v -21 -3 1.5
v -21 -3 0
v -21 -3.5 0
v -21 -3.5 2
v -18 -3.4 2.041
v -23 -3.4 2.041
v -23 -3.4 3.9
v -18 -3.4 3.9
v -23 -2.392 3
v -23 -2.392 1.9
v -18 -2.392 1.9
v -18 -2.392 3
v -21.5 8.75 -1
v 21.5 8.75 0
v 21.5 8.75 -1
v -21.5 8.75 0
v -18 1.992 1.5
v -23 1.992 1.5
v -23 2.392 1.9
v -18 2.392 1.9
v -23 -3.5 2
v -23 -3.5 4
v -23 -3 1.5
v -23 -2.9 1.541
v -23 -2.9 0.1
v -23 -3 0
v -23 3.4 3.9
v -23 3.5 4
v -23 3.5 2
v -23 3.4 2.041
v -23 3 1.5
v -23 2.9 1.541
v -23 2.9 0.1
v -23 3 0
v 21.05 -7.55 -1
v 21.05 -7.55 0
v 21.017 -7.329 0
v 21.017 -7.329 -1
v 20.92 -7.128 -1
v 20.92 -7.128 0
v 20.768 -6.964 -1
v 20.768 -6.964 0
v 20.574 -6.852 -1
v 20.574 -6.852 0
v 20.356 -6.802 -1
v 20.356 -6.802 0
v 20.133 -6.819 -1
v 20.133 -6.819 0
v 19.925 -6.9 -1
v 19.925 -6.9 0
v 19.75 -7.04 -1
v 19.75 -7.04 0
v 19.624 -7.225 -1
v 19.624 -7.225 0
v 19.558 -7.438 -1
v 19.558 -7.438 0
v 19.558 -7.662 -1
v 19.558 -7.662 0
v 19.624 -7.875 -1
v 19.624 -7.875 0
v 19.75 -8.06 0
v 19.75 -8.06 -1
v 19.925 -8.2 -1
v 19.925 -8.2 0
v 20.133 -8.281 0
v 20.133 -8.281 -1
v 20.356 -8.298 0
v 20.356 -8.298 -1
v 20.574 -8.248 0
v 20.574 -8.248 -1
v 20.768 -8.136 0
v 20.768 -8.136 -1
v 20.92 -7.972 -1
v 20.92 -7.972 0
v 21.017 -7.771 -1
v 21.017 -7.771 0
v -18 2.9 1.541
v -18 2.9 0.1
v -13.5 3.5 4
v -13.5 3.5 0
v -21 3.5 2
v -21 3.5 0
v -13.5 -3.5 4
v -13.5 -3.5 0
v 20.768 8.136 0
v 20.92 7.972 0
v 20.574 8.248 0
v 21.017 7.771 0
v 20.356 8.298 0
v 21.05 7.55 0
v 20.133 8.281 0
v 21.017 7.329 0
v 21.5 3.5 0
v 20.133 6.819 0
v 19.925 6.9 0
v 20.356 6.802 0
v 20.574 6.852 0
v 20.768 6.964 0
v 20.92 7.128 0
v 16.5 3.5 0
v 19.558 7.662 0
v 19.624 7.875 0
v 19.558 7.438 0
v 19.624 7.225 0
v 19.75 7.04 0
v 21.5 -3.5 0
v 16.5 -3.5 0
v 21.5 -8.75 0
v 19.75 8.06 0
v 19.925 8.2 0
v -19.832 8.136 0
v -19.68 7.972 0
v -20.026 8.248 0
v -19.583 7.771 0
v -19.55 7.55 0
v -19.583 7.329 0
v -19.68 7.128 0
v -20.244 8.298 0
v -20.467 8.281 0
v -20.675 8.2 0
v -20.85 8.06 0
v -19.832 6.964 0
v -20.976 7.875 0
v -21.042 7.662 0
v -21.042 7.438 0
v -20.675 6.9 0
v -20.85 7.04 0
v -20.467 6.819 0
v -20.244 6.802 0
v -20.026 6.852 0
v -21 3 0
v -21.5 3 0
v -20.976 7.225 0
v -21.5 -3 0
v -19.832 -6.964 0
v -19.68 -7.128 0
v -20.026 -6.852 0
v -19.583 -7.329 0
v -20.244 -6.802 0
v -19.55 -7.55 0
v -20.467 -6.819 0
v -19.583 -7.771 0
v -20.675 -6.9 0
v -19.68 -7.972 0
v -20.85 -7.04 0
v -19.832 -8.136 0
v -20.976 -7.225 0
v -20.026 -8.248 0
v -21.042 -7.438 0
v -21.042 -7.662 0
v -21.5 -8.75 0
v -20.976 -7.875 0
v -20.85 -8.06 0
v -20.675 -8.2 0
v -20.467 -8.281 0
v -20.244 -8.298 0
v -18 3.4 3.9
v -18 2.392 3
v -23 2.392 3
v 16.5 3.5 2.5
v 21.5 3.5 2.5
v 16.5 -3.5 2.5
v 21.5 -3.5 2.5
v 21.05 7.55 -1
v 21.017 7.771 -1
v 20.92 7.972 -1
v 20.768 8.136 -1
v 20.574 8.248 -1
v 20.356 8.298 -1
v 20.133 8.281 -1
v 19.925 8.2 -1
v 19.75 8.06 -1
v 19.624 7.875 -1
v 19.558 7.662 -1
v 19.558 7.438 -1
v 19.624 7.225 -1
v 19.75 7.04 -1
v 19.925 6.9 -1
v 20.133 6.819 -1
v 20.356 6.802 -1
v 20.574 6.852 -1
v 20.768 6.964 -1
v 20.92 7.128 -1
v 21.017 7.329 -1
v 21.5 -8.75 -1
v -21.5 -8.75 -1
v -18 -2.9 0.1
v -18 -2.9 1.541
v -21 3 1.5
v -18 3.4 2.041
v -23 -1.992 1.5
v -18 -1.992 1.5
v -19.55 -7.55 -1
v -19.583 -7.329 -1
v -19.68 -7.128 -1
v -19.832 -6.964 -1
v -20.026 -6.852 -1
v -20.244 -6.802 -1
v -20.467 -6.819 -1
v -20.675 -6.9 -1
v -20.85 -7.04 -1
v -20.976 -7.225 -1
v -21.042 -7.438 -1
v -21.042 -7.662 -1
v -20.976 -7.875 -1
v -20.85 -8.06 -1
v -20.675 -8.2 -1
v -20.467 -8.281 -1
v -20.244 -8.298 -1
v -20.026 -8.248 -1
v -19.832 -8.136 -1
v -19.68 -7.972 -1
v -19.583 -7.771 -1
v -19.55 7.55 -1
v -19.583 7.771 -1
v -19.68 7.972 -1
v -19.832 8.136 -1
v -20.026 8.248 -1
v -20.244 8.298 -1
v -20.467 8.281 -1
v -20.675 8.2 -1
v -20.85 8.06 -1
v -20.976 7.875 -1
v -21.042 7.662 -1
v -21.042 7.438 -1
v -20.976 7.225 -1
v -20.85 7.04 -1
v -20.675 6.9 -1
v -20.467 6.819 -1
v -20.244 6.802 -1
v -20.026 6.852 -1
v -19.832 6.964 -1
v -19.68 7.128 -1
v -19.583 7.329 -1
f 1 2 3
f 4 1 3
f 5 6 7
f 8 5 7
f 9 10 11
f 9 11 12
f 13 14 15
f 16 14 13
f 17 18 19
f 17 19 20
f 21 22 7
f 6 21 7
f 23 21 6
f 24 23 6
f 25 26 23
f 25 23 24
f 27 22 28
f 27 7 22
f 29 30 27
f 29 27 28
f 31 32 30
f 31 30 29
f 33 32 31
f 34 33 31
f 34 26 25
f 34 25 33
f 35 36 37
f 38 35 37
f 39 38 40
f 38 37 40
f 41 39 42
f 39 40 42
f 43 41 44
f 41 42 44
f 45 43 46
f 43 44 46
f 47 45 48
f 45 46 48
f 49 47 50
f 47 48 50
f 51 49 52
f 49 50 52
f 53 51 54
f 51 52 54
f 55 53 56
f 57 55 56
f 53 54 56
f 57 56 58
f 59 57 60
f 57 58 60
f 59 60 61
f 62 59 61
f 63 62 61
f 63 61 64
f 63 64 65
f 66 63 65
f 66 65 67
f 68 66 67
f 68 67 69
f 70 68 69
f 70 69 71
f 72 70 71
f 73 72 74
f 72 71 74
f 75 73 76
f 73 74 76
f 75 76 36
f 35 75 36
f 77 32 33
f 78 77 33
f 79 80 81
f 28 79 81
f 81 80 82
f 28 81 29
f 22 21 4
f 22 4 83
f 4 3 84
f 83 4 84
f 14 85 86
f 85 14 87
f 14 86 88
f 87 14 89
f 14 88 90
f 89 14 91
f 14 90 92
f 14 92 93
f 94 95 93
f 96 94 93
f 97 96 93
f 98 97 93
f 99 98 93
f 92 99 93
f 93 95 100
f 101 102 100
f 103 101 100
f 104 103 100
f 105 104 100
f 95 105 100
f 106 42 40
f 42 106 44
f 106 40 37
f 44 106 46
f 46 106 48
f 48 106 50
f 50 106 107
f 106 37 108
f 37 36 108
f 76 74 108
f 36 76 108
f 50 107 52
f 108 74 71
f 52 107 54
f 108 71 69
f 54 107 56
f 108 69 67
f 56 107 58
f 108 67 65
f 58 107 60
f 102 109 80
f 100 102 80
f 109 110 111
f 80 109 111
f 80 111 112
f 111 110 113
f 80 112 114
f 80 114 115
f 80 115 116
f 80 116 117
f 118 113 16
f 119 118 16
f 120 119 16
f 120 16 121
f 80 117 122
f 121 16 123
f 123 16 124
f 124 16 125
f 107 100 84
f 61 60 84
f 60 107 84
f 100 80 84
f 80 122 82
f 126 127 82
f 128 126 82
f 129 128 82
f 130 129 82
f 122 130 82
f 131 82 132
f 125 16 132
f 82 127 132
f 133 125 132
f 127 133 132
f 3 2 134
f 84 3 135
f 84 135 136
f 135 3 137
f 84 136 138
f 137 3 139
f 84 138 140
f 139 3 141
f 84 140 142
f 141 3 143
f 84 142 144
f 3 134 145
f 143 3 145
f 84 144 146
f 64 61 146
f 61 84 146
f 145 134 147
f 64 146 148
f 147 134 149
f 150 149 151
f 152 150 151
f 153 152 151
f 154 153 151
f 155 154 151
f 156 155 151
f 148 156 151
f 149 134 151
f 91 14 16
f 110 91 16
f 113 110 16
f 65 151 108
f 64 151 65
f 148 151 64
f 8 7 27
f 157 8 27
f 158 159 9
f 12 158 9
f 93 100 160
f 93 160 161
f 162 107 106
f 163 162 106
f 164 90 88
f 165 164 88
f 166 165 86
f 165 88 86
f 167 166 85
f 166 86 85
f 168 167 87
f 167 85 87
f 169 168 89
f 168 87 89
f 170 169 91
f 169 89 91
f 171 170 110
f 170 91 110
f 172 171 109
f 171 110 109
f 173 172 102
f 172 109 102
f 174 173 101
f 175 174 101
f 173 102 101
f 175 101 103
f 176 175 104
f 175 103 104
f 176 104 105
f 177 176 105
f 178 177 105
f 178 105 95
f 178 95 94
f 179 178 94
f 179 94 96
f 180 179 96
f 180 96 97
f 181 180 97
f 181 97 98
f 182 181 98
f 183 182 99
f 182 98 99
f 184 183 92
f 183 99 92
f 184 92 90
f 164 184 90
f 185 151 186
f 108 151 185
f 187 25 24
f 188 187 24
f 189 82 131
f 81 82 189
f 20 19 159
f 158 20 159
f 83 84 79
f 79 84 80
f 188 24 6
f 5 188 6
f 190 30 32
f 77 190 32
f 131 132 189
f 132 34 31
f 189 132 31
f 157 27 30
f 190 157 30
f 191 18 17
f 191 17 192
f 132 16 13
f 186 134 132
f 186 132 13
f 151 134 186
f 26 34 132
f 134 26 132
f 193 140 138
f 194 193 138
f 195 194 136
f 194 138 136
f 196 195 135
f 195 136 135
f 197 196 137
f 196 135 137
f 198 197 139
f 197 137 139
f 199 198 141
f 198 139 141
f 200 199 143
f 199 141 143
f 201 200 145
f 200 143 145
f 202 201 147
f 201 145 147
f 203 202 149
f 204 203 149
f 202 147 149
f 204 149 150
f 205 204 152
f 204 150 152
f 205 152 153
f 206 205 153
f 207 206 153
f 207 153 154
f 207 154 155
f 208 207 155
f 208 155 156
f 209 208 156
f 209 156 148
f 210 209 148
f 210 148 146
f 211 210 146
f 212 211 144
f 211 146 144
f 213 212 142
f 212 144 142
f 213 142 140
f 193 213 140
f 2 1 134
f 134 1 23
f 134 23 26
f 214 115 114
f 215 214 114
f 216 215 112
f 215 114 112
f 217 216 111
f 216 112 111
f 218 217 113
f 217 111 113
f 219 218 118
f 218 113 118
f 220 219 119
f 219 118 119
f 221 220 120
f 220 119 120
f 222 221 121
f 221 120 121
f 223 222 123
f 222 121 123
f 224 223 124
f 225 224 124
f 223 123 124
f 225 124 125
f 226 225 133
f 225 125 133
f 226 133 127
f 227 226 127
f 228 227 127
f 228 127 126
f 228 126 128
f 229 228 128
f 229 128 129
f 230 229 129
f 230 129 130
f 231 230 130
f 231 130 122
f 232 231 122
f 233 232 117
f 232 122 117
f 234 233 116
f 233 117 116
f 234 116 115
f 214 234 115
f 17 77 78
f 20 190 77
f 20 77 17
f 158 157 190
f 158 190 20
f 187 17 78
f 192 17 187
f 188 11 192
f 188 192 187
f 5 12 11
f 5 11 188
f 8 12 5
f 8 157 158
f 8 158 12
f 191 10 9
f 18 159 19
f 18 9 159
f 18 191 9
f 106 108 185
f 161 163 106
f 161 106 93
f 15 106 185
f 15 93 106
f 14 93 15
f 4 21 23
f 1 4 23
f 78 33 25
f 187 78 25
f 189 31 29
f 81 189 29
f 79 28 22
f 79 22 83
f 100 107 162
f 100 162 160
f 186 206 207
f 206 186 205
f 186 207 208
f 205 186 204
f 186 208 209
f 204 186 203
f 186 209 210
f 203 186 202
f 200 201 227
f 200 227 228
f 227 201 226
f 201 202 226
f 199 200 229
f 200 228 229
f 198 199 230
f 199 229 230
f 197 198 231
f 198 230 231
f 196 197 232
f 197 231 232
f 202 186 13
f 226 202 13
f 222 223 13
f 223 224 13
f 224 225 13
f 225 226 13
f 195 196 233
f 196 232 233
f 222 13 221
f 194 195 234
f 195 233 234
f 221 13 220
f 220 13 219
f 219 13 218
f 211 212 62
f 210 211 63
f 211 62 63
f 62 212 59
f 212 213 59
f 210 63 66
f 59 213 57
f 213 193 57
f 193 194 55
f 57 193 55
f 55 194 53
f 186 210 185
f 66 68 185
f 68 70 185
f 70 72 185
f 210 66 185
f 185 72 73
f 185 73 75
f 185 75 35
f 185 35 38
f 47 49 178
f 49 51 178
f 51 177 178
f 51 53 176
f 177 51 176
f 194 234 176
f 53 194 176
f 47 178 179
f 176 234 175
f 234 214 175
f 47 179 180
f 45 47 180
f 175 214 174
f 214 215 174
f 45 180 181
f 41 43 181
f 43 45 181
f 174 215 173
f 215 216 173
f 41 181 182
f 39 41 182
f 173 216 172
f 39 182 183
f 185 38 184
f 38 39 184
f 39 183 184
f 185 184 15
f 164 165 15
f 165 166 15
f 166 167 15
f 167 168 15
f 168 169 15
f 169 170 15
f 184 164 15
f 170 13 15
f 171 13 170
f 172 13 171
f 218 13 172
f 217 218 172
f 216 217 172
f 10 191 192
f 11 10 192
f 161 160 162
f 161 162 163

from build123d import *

# Parameters (mm, degrees)
F0_W     = 8
F0_H     = 7
F0_R     = 0.75
F0_W_2   = 5
F1_DEPTH = 1
F0_W_3   = 1.5
F2_DEPTH = 4
F3_DEPTH = 2.5
F4_W     = 4.784234
F4_H     = 1.5
F5_DEPTH = 5
F6_DEPTH = 2
F7_SIZE  = 0.4


with BuildPart() as f1:
    # F0 (on Top) → F1 (new body)
    with BuildSketch(Plane.XY):
        with Locations((-17.5, 0)):
            Rectangle(F0_W, F0_H)
        Polygon((21.5, 3.5), (21.5, 8.75), (-21.5, 8.75), (-21.5, 3.5), (-13.5, 3.5), (-13.5, -3.5), (-21.5, -3.5), (-21.5, -8.75), (21.5, -8.75), (21.5, -3.5), (16.5, -3.5), (16.5, 3.5), align=None)
        with Locations((-20.3, -7.55)):
            Circle(F0_R, mode=Mode.SUBTRACT)
        with Locations((20.3, -7.55)):
            Circle(F0_R, mode=Mode.SUBTRACT)
        with Locations((-20.3, 7.55)):
            Circle(F0_R, mode=Mode.SUBTRACT)
        with Locations((20.3, 7.55)):
            Circle(F0_R, mode=Mode.SUBTRACT)
        with Locations((19, 0)):
            Rectangle(F0_W_2, F0_H)
    extrude(amount=-F1_DEPTH)

    # F0 (on Top) → F2 (join)
    with BuildSketch(Plane.XY):
        with Locations((-22.25, 0)):
            Rectangle(F0_W_3, F0_H)
        with Locations((-17.5, 0)):
            Rectangle(F0_W, F0_H)
    extrude(amount=F2_DEPTH)

    # F0 (on Top) → F3 (join)
    with BuildSketch(Plane.XY):
        with Locations((19, 0)):
            Rectangle(F0_W_2, F0_H)
    extrude(amount=F3_DEPTH)

    # F4 (on face) → F5 (cut)
    with BuildSketch(Plane(origin=(-23, 0, 0), x_dir=(0, -1, 0), z_dir=(-1, 0, 0))):
        Polygon((3.4, 3.9), (-3.4, 3.9), (-3.4, 2.041421), (-2.9, 1.541421), (-2.9, 0.1), (2.9, 0.1), (2.9, 1.541421), (3.4, 2.041421), align=None)
        with Locations((0, 2.25)):
            Rectangle(F4_W, F4_H, mode=Mode.SUBTRACT)
    extrude(amount=-F5_DEPTH, mode=Mode.SUBTRACT)

    # F4 (on face) → F6 (cut)
    with BuildSketch(Plane(origin=(-23, 0, 0), x_dir=(0, -1, 0), z_dir=(-1, 0, 0))):
        Polygon((-3, 1.5), (-3.5, 2), (-3.5, 0), (-3, 0), align=None)
        Polygon((3, 1.5), (3, 0), (3.5, 0), (3.5, 2), align=None)
    extrude(amount=-F6_DEPTH, mode=Mode.SUBTRACT)

    # F7
    f7_edges = [f1.edges().sort_by_distance(p)[0] for p in [
        (-20.5, -2.392117, 1.5),
        (-20.5, 2.392117, 1.5),
    ]]
    chamfer(f7_edges, length=F7_SIZE)


solid = f1.part
